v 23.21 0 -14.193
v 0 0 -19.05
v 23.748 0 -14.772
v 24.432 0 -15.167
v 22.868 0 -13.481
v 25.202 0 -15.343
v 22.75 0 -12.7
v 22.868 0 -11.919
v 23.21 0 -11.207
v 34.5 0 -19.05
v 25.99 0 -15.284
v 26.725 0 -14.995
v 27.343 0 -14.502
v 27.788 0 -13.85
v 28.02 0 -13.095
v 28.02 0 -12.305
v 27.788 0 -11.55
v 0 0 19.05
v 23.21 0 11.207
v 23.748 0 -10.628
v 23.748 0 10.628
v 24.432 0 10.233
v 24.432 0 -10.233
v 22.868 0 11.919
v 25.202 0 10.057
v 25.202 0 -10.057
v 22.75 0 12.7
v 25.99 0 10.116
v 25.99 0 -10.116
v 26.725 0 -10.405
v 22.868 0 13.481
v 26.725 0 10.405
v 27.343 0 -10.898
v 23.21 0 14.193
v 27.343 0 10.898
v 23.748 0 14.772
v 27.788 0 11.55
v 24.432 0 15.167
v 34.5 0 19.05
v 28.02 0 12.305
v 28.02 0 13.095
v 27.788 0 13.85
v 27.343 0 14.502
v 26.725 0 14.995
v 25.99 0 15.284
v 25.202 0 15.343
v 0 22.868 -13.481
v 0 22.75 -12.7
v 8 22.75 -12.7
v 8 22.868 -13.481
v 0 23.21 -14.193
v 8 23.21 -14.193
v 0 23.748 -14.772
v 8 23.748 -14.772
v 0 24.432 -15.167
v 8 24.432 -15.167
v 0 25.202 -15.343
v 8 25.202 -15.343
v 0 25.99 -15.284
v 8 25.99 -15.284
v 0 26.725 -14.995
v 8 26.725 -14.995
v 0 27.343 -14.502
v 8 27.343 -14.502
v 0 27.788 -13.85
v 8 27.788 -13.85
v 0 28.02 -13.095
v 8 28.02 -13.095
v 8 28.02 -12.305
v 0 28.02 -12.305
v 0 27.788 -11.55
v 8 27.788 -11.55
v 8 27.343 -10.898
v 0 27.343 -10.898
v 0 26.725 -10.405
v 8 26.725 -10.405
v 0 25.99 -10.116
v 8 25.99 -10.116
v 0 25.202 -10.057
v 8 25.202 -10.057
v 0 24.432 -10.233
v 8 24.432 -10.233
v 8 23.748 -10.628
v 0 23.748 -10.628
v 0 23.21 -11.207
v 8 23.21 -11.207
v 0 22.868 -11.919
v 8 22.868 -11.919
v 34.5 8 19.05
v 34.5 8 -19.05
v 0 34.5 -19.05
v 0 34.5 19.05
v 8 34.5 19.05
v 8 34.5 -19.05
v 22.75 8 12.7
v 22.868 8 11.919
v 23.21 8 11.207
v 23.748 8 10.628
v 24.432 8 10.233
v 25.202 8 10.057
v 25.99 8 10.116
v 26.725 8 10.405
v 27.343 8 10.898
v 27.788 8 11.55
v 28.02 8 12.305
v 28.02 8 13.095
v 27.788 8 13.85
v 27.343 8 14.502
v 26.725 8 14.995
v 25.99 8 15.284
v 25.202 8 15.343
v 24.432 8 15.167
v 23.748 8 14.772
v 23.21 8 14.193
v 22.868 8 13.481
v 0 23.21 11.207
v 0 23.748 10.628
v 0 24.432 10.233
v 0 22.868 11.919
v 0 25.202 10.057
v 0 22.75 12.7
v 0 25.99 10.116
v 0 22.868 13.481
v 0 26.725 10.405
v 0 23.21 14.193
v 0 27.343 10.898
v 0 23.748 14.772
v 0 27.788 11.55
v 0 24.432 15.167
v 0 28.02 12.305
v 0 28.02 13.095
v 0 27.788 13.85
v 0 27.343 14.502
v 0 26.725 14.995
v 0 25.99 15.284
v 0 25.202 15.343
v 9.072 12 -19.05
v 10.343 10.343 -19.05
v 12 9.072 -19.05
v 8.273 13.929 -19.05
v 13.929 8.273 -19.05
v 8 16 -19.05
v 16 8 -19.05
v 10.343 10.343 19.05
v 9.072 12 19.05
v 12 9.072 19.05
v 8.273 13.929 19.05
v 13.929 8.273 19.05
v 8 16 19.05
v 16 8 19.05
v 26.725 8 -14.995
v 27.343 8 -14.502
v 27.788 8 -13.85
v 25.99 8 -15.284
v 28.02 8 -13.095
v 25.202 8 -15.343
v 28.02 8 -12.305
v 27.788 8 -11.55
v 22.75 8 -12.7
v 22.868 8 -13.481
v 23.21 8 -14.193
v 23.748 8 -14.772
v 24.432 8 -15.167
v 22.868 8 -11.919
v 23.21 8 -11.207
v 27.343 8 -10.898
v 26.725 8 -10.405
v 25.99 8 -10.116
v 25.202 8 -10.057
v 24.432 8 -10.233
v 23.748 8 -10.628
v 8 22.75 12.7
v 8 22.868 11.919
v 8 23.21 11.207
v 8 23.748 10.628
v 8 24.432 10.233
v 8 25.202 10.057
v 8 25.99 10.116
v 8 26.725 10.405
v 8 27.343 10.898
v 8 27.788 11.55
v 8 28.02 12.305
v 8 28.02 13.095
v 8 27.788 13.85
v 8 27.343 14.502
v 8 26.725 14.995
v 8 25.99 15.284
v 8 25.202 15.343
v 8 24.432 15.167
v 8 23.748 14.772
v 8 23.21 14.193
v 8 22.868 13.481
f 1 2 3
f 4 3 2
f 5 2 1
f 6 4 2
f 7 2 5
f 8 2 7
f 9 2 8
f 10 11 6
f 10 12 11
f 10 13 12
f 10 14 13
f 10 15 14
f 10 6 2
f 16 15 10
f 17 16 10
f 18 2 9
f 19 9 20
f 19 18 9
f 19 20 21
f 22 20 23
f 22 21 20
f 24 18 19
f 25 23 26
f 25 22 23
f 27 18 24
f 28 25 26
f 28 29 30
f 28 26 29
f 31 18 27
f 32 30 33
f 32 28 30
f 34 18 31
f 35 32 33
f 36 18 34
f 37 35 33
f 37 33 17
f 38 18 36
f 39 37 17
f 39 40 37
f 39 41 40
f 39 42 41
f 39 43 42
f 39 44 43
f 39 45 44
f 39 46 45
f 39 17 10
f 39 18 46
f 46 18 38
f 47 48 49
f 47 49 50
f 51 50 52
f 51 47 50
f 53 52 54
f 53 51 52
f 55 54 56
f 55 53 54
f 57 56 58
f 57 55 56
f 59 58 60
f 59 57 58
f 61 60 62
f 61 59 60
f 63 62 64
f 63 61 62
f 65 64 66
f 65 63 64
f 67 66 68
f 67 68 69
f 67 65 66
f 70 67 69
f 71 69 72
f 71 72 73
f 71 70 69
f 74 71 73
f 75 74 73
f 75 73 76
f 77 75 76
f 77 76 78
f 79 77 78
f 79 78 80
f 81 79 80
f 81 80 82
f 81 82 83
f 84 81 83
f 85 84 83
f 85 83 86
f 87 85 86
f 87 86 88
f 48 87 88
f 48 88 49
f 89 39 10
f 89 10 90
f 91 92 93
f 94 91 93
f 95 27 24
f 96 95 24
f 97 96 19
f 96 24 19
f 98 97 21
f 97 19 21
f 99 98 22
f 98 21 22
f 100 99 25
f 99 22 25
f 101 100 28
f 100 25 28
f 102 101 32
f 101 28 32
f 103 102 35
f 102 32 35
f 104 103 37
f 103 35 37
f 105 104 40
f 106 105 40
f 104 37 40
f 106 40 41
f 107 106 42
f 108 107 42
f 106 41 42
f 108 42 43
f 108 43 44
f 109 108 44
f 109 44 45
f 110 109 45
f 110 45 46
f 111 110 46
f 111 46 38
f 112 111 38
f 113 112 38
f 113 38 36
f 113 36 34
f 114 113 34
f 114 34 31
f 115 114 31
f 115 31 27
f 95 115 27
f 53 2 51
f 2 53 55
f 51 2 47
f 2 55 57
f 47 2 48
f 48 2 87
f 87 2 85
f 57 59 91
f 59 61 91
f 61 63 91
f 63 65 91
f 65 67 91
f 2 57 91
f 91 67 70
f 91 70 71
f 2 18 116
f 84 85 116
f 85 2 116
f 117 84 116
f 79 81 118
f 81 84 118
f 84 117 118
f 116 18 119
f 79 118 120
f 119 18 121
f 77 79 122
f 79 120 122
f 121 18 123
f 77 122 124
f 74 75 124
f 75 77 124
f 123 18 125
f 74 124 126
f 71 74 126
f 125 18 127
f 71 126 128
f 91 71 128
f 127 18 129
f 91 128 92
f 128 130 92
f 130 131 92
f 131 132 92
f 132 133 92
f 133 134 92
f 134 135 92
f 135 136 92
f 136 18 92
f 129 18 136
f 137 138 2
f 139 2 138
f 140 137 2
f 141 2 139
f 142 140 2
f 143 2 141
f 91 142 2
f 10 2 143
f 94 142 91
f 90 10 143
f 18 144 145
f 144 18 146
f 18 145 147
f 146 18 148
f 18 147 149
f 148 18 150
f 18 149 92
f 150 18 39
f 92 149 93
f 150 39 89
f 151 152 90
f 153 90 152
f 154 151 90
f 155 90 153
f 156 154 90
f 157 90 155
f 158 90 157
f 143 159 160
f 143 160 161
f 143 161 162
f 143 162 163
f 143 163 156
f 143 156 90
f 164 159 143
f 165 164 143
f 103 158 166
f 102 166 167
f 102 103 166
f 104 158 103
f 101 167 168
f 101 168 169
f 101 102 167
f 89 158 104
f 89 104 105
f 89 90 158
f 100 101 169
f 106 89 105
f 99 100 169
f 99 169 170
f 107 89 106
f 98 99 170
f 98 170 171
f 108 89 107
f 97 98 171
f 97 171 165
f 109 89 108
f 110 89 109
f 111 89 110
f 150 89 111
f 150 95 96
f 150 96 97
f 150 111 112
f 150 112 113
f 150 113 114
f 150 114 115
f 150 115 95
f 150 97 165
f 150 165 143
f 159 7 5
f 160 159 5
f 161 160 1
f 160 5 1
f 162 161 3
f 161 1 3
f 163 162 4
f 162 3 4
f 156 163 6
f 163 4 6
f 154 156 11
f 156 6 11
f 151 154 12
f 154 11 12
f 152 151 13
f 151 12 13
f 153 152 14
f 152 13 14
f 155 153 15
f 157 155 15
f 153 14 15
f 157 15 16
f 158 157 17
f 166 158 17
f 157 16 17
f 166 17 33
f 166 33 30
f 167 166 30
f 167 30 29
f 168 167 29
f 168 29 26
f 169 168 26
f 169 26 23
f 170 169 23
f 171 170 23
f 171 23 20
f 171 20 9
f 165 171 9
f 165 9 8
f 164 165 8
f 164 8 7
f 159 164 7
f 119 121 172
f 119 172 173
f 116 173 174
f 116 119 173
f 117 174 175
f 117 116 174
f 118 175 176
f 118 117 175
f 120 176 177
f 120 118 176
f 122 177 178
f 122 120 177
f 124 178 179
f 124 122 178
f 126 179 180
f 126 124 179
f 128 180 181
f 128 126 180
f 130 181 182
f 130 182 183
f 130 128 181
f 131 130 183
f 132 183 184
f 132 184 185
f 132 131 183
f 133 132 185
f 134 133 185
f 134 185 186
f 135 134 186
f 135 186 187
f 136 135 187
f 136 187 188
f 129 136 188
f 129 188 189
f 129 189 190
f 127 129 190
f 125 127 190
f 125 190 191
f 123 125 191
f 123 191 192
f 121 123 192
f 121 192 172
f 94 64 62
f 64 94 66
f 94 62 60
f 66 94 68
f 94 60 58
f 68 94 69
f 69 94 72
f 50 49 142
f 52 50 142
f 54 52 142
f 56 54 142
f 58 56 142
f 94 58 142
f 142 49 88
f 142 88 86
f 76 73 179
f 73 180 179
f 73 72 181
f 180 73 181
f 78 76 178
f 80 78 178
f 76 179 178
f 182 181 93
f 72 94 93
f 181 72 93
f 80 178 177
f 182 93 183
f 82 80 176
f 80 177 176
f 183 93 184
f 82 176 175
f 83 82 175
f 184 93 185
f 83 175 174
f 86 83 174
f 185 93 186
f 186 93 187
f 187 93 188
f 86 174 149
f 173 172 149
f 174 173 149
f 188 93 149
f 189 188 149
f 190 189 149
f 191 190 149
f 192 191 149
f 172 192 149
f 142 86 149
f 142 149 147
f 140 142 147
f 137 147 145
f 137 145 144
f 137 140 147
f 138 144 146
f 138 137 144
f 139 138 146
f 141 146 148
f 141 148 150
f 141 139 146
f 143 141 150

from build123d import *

# Parameters (mm, degrees)
BOSS_EXTRUDE1_DEPTH  = 19.05
M5_CLEARANCE_HOLE1_D = 5.3
FILLET1_R            = 8


with BuildPart() as part:
    # Sketch1 → Boss-Extrude1 (new, symmetric)
    with BuildSketch(Plane.XY):
        Polygon((0, 0), (34.5, 0), (34.5, 8), (8, 8), align=None)
    extrude(amount=BOSS_EXTRUDE1_DEPTH, both=True)

    # M5 Clearance Hole1 (through all)
    with Locations(Plane(origin=(0, 8, 0), x_dir=(1, 0, 0), z_dir=(0, 1, 0))):
        with Locations((25.4, 12.7), (25.4, -12.7)):
            Hole(M5_CLEARANCE_HOLE1_D / 2)

    # Mirror1: part across plane


with BuildPart() as part_1:
    add(part.part)
    add(part.part.mirror(Plane(origin=(0, 0, 19.05), x_dir=(0, 0, 1), z_dir=(0.7071067811865475, -0.7071067811865478, 0))))

    # Fillet1
    fillet1_edges = [part_1.edges().sort_by_distance(p)[0] for p in [
        (8, 8, 0),
    ]]
    fillet(fillet1_edges, radius=FILLET1_R)


solid = part_1.part
